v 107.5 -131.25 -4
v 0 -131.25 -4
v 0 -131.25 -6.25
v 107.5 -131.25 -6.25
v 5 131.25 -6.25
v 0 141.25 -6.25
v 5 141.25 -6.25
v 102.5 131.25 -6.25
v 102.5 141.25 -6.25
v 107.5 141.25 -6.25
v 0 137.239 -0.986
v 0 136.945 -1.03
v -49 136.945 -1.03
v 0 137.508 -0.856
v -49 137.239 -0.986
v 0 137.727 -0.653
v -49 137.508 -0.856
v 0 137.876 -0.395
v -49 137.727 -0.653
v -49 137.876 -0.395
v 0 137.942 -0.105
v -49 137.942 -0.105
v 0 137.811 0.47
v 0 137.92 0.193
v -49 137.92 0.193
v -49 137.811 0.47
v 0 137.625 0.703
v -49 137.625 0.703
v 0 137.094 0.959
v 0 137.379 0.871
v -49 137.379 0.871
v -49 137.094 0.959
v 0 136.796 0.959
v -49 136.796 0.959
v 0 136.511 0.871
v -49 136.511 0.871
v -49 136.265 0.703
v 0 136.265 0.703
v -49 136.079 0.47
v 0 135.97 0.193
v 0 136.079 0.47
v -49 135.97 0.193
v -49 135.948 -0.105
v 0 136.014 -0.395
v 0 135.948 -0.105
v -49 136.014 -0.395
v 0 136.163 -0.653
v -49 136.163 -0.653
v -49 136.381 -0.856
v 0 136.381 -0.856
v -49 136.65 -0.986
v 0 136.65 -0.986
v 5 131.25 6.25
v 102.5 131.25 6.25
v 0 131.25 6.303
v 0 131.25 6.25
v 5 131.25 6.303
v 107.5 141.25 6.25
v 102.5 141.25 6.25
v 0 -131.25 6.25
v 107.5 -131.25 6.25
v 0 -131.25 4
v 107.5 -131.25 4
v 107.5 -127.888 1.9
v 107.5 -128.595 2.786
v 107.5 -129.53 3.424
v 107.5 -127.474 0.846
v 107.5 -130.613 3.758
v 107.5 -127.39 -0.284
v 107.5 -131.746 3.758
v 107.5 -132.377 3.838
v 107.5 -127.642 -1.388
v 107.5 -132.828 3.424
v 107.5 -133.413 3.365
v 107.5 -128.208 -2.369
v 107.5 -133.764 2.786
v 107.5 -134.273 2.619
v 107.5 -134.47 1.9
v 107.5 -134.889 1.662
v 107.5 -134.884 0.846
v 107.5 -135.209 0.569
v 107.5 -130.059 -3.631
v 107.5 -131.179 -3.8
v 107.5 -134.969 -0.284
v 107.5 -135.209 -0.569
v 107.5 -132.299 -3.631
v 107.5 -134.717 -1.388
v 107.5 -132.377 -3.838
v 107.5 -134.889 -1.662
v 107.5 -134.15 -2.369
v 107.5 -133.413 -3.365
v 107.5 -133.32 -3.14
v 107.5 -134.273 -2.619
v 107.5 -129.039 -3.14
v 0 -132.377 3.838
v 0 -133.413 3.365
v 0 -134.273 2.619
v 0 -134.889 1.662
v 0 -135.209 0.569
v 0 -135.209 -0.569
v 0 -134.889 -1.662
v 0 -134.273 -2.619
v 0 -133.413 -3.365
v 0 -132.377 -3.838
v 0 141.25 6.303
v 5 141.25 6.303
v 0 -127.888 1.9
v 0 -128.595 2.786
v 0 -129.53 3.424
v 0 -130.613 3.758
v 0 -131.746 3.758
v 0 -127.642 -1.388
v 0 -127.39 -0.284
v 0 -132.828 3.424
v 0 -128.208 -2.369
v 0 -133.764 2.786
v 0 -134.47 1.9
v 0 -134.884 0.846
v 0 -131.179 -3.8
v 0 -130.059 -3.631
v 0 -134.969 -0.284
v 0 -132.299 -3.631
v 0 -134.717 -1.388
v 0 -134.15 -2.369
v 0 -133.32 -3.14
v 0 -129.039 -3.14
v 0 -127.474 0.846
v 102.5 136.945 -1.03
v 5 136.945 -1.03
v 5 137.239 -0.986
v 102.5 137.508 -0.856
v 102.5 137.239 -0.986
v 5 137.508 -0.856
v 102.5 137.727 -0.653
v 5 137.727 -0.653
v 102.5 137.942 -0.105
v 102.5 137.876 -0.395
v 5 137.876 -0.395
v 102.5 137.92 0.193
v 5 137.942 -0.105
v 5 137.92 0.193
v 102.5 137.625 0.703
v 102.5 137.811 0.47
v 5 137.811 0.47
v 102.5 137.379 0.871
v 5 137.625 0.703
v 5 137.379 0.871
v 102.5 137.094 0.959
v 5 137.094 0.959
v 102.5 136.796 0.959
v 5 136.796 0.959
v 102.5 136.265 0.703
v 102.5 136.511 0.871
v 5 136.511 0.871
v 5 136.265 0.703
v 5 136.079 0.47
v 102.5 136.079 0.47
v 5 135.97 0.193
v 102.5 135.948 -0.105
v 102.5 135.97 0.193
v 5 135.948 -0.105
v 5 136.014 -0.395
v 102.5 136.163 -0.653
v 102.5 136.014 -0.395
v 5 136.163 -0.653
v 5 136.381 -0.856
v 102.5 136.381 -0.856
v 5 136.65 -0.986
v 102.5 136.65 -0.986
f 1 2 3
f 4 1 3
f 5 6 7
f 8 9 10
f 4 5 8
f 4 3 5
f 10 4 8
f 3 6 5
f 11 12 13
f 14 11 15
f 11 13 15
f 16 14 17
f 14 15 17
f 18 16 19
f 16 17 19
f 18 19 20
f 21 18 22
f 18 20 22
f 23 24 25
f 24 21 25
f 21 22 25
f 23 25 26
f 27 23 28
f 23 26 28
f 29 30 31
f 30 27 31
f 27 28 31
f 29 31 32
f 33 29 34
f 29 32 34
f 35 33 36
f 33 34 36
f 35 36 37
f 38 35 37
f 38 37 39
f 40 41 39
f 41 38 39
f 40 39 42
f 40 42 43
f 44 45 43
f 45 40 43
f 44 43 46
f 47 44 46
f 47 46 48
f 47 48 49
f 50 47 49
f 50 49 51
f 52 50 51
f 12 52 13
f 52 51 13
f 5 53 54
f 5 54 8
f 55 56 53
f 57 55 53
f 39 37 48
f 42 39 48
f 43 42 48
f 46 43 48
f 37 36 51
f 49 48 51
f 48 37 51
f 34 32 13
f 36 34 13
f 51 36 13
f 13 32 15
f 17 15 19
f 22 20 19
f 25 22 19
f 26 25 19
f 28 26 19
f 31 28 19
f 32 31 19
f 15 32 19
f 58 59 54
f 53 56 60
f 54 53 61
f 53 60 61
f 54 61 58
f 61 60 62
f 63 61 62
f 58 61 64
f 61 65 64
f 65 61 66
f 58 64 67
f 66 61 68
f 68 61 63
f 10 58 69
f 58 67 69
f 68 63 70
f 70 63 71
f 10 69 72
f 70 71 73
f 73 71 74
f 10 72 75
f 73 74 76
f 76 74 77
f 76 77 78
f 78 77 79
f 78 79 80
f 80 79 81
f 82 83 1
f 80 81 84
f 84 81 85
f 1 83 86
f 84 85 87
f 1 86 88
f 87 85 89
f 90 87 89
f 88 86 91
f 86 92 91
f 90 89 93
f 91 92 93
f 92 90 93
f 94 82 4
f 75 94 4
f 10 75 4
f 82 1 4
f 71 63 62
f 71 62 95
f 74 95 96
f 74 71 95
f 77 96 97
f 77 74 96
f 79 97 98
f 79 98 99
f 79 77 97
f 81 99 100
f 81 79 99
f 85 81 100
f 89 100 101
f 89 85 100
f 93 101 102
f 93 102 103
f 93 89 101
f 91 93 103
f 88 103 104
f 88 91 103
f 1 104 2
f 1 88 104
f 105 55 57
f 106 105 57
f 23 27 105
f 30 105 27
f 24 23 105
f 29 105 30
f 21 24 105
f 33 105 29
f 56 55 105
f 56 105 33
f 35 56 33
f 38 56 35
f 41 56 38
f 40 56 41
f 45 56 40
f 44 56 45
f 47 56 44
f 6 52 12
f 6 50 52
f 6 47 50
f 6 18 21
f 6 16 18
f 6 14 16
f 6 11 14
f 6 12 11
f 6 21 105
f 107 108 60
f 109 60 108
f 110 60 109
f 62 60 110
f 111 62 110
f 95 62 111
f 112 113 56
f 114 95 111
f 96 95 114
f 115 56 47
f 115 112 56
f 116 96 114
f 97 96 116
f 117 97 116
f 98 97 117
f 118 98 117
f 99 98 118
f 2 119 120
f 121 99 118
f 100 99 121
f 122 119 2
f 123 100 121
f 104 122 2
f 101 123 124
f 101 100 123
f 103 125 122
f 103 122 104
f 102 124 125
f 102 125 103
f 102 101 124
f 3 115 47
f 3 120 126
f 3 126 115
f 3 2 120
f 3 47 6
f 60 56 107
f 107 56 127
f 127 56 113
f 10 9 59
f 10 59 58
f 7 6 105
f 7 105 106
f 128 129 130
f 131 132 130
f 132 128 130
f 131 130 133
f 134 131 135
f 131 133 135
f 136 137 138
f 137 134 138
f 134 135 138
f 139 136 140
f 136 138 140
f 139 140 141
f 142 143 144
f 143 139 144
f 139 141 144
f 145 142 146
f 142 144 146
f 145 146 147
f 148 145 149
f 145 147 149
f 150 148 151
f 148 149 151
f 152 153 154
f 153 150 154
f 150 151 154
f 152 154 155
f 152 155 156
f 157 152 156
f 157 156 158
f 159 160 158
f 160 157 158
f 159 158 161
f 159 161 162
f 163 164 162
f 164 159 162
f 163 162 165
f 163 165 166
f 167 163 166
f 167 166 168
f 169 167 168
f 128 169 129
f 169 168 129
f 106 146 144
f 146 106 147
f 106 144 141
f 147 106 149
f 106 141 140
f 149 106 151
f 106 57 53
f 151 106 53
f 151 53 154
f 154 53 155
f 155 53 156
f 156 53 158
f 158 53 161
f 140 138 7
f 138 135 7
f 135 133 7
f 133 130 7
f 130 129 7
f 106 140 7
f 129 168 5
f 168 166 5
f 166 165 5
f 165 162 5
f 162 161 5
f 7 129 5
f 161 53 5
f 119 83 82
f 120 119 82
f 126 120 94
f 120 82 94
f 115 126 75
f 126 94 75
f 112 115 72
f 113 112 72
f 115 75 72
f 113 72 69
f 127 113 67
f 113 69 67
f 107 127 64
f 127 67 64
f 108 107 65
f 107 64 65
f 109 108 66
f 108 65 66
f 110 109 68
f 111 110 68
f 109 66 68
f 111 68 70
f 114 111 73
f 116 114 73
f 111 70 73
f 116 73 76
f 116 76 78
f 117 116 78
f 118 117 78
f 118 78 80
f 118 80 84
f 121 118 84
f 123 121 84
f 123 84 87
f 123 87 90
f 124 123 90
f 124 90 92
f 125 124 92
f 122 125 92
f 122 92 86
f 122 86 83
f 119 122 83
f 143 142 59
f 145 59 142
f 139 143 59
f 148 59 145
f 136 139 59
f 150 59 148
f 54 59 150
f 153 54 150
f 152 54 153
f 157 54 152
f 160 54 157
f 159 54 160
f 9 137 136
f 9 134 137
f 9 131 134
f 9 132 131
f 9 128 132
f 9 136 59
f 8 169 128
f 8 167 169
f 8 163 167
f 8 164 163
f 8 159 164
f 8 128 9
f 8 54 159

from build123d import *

# Parameters (mm, degrees)
ESQUISSE1_W             = 12.5
ESQUISSE1_H             = 262.5
BOSS_EXTRU_1_DEPTH      = 107.5
ESQUISSE5_R             = 4
BOSS_EXTRU_2_DEPTH      = 107.5
ESQUISSE6_R             = 3.8
ENL_V_MAT_EXTRU_1_DEPTH = 108.5
ESQUISSE8_W             = 5
ESQUISSE8_H             = 12.552801664
BOSS_EXTRU_3_DEPTH      = 10
ESQUISSE9_W             = 5
ESQUISSE9_H             = 12.5
BOSS_EXTRU_4_DEPTH      = 10
BOSS_EXTRU_5_DEPTH      = 101
BOSS_EXTRU_5_DEPTH_BACK = 54
ESQUISSE12_R            = 1


with BuildPart() as part:
    # Esquisse1 → Boss.-Extru.1 (new body)
    with BuildSketch(Plane(origin=(0, 0, 0), x_dir=(0, 0, -1), z_dir=(1, 0, 0))):
        Rectangle(ESQUISSE1_W, ESQUISSE1_H)
    extrude(amount=BOSS_EXTRU_1_DEPTH)

    # Esquisse5 → Boss.-Extru.2 (add)
    with BuildSketch(Plane(origin=(107.5, 0, 0), x_dir=(0, 0, -1), z_dir=(1, 0, 0))):
        with Locations((0, -131.25)):
            Circle(ESQUISSE5_R)
    extrude(amount=-BOSS_EXTRU_2_DEPTH)

    # Esquisse6 → Enlèv. mat.-Extru.1 (cut)
    with BuildSketch(Plane(origin=(107.5, 0, 0), x_dir=(0, 0, -1), z_dir=(1, 0, 0))):
        with Locations((0, -131.179209748)):
            Circle(ESQUISSE6_R)
    extrude(amount=-ENL_V_MAT_EXTRU_1_DEPTH, mode=Mode.SUBTRACT)

    # Esquisse8 → Boss.-Extru.3 (add)
    with BuildSketch(Plane(origin=(0, 131.25, 0), x_dir=(1, 0, 0), z_dir=(0, 1, 0))):
        with Locations((2.5, -0.026400832)):
            Rectangle(ESQUISSE8_W, ESQUISSE8_H)
    extrude(amount=BOSS_EXTRU_3_DEPTH)

    # Esquisse9 → Boss.-Extru.4 (add)
    with BuildSketch(Plane(origin=(0, 131.25, 0), x_dir=(1, 0, 0), z_dir=(0, 1, 0))):
        with Locations((105, 0)):
            Rectangle(ESQUISSE9_W, ESQUISSE9_H)
    extrude(amount=BOSS_EXTRU_4_DEPTH)

    # Esquisse12 → Boss.-Extru.5 (add, two sides: drawn at the far end of the back side and taken through both)
    with BuildSketch(Plane(origin=(5, 0, 0), x_dir=(0, 0, -1), z_dir=(1, 0, 0)).offset(-BOSS_EXTRU_5_DEPTH_BACK)):
        with Locations((0.03, 136.944722229)):
            Circle(ESQUISSE12_R)
    extrude(amount=BOSS_EXTRU_5_DEPTH + BOSS_EXTRU_5_DEPTH_BACK)


solid = part.part
